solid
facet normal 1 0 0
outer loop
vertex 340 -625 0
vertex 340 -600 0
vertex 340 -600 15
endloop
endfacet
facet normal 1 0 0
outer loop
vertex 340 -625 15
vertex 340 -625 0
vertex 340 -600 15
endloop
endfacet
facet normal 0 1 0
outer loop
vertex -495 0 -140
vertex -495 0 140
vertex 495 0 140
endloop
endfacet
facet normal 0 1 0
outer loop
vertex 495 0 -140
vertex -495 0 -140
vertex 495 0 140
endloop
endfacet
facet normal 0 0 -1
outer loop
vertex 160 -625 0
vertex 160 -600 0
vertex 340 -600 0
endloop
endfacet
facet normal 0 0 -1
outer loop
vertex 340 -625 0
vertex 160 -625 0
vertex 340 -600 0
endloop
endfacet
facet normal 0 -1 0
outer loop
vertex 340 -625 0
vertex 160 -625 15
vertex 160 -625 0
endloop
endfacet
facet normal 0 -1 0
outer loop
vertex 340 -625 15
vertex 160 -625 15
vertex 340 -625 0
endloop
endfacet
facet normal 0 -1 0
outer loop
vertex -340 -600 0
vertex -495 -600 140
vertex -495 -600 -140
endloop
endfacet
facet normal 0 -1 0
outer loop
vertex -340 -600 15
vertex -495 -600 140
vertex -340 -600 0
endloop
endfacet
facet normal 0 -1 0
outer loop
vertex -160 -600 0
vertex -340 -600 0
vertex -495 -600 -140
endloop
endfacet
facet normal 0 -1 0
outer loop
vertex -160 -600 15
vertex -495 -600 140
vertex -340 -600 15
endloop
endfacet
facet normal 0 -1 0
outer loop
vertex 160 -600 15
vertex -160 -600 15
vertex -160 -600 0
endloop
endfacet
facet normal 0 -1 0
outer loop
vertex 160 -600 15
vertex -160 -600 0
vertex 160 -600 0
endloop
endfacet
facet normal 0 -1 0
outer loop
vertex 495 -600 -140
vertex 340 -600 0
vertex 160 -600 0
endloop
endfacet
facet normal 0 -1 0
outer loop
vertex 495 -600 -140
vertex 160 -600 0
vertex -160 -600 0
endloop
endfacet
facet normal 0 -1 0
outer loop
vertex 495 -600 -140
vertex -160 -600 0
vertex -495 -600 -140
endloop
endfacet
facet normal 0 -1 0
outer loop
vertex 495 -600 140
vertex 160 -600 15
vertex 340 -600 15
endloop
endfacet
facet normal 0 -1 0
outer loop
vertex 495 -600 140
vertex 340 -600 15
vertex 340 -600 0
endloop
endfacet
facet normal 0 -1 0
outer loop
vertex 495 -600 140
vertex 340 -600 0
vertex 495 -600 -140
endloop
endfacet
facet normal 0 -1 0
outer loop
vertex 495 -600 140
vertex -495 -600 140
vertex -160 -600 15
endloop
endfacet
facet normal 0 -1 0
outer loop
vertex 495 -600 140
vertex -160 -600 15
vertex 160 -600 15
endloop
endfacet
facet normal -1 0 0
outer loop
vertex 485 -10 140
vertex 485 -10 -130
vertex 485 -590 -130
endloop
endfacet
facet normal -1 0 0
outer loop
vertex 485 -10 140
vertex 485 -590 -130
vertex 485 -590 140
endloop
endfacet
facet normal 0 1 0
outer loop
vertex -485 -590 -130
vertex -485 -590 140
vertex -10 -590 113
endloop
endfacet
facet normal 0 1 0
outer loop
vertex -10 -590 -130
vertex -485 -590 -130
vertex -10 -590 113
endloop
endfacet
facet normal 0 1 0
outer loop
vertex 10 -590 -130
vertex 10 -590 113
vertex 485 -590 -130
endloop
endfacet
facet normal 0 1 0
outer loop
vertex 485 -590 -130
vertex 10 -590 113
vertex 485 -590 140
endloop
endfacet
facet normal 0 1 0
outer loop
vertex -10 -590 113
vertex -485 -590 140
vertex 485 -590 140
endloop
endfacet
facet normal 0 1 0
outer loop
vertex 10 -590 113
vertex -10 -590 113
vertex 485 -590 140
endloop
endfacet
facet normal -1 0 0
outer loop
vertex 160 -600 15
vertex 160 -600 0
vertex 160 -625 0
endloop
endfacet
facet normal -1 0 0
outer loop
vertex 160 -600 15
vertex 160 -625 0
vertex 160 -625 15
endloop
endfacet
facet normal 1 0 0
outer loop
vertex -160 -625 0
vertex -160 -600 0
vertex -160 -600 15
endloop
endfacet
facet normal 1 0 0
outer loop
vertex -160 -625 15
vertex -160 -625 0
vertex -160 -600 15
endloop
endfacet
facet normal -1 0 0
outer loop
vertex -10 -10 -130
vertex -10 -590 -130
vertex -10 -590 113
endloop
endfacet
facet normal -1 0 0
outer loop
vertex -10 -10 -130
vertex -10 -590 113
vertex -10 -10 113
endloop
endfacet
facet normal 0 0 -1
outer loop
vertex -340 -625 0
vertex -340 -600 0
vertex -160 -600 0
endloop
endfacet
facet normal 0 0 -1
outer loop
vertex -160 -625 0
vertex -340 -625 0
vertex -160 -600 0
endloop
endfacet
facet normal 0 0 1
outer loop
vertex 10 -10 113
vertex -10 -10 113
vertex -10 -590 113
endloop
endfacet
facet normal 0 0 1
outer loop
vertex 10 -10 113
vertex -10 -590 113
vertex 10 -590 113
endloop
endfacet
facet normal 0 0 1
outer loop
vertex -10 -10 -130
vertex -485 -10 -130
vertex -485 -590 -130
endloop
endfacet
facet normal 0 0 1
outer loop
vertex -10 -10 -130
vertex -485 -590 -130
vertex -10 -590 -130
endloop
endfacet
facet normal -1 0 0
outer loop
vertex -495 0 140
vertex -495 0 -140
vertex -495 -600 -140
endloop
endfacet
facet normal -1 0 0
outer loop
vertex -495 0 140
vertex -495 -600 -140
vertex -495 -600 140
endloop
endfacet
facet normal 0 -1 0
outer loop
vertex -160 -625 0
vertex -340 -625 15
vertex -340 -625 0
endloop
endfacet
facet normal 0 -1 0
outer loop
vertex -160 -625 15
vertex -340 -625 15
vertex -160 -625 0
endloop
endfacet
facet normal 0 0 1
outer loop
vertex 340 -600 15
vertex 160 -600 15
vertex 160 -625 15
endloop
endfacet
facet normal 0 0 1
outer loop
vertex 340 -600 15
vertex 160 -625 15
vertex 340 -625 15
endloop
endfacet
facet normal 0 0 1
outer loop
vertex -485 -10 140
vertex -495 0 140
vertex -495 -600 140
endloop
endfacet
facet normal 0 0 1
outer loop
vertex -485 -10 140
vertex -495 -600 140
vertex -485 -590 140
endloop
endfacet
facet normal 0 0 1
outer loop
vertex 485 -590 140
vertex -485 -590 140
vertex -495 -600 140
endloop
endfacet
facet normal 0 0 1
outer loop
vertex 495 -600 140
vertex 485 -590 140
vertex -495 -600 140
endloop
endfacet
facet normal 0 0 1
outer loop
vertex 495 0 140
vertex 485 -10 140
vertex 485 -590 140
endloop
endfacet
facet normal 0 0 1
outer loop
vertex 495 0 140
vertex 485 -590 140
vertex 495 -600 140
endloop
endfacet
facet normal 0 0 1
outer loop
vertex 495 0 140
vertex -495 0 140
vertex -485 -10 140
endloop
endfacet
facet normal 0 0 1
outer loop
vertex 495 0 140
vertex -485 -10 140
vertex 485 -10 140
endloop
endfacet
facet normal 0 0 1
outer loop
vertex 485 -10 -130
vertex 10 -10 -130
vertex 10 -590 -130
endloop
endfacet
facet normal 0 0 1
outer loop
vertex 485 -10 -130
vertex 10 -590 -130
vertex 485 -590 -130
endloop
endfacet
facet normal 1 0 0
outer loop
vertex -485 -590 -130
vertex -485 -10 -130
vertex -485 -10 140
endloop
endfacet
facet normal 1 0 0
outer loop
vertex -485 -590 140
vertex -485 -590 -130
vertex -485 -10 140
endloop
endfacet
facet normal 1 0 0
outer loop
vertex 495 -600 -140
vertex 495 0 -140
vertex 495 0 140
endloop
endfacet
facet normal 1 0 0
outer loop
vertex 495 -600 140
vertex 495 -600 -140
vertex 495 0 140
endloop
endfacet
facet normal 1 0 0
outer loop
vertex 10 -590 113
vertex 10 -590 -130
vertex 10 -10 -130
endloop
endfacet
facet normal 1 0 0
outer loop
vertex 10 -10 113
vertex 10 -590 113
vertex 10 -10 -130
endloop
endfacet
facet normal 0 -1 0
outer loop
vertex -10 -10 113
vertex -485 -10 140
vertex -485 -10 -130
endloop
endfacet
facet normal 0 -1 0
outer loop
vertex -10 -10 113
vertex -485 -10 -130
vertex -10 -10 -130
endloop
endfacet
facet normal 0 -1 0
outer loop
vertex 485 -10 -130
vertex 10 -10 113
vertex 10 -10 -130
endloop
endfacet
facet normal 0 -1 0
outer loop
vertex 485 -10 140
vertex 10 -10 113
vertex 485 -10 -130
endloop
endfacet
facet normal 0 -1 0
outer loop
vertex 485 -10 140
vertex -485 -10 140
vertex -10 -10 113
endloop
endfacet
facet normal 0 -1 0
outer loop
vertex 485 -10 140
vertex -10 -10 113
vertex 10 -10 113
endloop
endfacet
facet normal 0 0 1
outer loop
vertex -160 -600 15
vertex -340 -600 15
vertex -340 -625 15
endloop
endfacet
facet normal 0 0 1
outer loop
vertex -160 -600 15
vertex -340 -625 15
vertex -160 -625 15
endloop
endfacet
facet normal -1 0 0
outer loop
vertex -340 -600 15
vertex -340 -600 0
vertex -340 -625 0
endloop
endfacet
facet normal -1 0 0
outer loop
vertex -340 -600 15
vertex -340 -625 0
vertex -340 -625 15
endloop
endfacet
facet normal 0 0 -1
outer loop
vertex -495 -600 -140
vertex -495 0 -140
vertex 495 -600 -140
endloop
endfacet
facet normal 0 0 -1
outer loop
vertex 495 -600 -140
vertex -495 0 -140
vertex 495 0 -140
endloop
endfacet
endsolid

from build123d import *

# Parameters (mm, degrees)
F0_W     = 990
F0_H     = 280
F1_DEPTH = 600
F2_T     = -10
F3_W     = 20
F3_H     = 580
F4_DEPTH = 243
F5_W     = 180
F5_H     = 15
F6_DEPTH = 25


with BuildPart() as f1:
    # F0 (on Front) → F1 (new body)
    with BuildSketch(Plane.XZ):
        Rectangle(F0_W, F0_H)
    extrude(amount=F1_DEPTH)

    # F2
    f2_openings = [f1.faces().sort_by_distance(p)[0] for p in [
        (0, -300, 140),
    ]]
    offset(amount=F2_T, openings=f2_openings)

    # F3 (on face) → F4 (join)
    with BuildSketch(Plane.XY.offset(-130)):
        with Locations((0, -300)):
            Rectangle(F3_W, F3_H)
    extrude(amount=F4_DEPTH)

    # F5 (on face) → F6 (join)
    with BuildSketch(Plane.XZ.offset(600)):
        with Locations((250, 7.5)):
            Rectangle(F5_W, F5_H)
        with Locations((-250, 7.5)):
            Rectangle(F5_W, F5_H)
    extrude(amount=F6_DEPTH)


solid = f1.part
